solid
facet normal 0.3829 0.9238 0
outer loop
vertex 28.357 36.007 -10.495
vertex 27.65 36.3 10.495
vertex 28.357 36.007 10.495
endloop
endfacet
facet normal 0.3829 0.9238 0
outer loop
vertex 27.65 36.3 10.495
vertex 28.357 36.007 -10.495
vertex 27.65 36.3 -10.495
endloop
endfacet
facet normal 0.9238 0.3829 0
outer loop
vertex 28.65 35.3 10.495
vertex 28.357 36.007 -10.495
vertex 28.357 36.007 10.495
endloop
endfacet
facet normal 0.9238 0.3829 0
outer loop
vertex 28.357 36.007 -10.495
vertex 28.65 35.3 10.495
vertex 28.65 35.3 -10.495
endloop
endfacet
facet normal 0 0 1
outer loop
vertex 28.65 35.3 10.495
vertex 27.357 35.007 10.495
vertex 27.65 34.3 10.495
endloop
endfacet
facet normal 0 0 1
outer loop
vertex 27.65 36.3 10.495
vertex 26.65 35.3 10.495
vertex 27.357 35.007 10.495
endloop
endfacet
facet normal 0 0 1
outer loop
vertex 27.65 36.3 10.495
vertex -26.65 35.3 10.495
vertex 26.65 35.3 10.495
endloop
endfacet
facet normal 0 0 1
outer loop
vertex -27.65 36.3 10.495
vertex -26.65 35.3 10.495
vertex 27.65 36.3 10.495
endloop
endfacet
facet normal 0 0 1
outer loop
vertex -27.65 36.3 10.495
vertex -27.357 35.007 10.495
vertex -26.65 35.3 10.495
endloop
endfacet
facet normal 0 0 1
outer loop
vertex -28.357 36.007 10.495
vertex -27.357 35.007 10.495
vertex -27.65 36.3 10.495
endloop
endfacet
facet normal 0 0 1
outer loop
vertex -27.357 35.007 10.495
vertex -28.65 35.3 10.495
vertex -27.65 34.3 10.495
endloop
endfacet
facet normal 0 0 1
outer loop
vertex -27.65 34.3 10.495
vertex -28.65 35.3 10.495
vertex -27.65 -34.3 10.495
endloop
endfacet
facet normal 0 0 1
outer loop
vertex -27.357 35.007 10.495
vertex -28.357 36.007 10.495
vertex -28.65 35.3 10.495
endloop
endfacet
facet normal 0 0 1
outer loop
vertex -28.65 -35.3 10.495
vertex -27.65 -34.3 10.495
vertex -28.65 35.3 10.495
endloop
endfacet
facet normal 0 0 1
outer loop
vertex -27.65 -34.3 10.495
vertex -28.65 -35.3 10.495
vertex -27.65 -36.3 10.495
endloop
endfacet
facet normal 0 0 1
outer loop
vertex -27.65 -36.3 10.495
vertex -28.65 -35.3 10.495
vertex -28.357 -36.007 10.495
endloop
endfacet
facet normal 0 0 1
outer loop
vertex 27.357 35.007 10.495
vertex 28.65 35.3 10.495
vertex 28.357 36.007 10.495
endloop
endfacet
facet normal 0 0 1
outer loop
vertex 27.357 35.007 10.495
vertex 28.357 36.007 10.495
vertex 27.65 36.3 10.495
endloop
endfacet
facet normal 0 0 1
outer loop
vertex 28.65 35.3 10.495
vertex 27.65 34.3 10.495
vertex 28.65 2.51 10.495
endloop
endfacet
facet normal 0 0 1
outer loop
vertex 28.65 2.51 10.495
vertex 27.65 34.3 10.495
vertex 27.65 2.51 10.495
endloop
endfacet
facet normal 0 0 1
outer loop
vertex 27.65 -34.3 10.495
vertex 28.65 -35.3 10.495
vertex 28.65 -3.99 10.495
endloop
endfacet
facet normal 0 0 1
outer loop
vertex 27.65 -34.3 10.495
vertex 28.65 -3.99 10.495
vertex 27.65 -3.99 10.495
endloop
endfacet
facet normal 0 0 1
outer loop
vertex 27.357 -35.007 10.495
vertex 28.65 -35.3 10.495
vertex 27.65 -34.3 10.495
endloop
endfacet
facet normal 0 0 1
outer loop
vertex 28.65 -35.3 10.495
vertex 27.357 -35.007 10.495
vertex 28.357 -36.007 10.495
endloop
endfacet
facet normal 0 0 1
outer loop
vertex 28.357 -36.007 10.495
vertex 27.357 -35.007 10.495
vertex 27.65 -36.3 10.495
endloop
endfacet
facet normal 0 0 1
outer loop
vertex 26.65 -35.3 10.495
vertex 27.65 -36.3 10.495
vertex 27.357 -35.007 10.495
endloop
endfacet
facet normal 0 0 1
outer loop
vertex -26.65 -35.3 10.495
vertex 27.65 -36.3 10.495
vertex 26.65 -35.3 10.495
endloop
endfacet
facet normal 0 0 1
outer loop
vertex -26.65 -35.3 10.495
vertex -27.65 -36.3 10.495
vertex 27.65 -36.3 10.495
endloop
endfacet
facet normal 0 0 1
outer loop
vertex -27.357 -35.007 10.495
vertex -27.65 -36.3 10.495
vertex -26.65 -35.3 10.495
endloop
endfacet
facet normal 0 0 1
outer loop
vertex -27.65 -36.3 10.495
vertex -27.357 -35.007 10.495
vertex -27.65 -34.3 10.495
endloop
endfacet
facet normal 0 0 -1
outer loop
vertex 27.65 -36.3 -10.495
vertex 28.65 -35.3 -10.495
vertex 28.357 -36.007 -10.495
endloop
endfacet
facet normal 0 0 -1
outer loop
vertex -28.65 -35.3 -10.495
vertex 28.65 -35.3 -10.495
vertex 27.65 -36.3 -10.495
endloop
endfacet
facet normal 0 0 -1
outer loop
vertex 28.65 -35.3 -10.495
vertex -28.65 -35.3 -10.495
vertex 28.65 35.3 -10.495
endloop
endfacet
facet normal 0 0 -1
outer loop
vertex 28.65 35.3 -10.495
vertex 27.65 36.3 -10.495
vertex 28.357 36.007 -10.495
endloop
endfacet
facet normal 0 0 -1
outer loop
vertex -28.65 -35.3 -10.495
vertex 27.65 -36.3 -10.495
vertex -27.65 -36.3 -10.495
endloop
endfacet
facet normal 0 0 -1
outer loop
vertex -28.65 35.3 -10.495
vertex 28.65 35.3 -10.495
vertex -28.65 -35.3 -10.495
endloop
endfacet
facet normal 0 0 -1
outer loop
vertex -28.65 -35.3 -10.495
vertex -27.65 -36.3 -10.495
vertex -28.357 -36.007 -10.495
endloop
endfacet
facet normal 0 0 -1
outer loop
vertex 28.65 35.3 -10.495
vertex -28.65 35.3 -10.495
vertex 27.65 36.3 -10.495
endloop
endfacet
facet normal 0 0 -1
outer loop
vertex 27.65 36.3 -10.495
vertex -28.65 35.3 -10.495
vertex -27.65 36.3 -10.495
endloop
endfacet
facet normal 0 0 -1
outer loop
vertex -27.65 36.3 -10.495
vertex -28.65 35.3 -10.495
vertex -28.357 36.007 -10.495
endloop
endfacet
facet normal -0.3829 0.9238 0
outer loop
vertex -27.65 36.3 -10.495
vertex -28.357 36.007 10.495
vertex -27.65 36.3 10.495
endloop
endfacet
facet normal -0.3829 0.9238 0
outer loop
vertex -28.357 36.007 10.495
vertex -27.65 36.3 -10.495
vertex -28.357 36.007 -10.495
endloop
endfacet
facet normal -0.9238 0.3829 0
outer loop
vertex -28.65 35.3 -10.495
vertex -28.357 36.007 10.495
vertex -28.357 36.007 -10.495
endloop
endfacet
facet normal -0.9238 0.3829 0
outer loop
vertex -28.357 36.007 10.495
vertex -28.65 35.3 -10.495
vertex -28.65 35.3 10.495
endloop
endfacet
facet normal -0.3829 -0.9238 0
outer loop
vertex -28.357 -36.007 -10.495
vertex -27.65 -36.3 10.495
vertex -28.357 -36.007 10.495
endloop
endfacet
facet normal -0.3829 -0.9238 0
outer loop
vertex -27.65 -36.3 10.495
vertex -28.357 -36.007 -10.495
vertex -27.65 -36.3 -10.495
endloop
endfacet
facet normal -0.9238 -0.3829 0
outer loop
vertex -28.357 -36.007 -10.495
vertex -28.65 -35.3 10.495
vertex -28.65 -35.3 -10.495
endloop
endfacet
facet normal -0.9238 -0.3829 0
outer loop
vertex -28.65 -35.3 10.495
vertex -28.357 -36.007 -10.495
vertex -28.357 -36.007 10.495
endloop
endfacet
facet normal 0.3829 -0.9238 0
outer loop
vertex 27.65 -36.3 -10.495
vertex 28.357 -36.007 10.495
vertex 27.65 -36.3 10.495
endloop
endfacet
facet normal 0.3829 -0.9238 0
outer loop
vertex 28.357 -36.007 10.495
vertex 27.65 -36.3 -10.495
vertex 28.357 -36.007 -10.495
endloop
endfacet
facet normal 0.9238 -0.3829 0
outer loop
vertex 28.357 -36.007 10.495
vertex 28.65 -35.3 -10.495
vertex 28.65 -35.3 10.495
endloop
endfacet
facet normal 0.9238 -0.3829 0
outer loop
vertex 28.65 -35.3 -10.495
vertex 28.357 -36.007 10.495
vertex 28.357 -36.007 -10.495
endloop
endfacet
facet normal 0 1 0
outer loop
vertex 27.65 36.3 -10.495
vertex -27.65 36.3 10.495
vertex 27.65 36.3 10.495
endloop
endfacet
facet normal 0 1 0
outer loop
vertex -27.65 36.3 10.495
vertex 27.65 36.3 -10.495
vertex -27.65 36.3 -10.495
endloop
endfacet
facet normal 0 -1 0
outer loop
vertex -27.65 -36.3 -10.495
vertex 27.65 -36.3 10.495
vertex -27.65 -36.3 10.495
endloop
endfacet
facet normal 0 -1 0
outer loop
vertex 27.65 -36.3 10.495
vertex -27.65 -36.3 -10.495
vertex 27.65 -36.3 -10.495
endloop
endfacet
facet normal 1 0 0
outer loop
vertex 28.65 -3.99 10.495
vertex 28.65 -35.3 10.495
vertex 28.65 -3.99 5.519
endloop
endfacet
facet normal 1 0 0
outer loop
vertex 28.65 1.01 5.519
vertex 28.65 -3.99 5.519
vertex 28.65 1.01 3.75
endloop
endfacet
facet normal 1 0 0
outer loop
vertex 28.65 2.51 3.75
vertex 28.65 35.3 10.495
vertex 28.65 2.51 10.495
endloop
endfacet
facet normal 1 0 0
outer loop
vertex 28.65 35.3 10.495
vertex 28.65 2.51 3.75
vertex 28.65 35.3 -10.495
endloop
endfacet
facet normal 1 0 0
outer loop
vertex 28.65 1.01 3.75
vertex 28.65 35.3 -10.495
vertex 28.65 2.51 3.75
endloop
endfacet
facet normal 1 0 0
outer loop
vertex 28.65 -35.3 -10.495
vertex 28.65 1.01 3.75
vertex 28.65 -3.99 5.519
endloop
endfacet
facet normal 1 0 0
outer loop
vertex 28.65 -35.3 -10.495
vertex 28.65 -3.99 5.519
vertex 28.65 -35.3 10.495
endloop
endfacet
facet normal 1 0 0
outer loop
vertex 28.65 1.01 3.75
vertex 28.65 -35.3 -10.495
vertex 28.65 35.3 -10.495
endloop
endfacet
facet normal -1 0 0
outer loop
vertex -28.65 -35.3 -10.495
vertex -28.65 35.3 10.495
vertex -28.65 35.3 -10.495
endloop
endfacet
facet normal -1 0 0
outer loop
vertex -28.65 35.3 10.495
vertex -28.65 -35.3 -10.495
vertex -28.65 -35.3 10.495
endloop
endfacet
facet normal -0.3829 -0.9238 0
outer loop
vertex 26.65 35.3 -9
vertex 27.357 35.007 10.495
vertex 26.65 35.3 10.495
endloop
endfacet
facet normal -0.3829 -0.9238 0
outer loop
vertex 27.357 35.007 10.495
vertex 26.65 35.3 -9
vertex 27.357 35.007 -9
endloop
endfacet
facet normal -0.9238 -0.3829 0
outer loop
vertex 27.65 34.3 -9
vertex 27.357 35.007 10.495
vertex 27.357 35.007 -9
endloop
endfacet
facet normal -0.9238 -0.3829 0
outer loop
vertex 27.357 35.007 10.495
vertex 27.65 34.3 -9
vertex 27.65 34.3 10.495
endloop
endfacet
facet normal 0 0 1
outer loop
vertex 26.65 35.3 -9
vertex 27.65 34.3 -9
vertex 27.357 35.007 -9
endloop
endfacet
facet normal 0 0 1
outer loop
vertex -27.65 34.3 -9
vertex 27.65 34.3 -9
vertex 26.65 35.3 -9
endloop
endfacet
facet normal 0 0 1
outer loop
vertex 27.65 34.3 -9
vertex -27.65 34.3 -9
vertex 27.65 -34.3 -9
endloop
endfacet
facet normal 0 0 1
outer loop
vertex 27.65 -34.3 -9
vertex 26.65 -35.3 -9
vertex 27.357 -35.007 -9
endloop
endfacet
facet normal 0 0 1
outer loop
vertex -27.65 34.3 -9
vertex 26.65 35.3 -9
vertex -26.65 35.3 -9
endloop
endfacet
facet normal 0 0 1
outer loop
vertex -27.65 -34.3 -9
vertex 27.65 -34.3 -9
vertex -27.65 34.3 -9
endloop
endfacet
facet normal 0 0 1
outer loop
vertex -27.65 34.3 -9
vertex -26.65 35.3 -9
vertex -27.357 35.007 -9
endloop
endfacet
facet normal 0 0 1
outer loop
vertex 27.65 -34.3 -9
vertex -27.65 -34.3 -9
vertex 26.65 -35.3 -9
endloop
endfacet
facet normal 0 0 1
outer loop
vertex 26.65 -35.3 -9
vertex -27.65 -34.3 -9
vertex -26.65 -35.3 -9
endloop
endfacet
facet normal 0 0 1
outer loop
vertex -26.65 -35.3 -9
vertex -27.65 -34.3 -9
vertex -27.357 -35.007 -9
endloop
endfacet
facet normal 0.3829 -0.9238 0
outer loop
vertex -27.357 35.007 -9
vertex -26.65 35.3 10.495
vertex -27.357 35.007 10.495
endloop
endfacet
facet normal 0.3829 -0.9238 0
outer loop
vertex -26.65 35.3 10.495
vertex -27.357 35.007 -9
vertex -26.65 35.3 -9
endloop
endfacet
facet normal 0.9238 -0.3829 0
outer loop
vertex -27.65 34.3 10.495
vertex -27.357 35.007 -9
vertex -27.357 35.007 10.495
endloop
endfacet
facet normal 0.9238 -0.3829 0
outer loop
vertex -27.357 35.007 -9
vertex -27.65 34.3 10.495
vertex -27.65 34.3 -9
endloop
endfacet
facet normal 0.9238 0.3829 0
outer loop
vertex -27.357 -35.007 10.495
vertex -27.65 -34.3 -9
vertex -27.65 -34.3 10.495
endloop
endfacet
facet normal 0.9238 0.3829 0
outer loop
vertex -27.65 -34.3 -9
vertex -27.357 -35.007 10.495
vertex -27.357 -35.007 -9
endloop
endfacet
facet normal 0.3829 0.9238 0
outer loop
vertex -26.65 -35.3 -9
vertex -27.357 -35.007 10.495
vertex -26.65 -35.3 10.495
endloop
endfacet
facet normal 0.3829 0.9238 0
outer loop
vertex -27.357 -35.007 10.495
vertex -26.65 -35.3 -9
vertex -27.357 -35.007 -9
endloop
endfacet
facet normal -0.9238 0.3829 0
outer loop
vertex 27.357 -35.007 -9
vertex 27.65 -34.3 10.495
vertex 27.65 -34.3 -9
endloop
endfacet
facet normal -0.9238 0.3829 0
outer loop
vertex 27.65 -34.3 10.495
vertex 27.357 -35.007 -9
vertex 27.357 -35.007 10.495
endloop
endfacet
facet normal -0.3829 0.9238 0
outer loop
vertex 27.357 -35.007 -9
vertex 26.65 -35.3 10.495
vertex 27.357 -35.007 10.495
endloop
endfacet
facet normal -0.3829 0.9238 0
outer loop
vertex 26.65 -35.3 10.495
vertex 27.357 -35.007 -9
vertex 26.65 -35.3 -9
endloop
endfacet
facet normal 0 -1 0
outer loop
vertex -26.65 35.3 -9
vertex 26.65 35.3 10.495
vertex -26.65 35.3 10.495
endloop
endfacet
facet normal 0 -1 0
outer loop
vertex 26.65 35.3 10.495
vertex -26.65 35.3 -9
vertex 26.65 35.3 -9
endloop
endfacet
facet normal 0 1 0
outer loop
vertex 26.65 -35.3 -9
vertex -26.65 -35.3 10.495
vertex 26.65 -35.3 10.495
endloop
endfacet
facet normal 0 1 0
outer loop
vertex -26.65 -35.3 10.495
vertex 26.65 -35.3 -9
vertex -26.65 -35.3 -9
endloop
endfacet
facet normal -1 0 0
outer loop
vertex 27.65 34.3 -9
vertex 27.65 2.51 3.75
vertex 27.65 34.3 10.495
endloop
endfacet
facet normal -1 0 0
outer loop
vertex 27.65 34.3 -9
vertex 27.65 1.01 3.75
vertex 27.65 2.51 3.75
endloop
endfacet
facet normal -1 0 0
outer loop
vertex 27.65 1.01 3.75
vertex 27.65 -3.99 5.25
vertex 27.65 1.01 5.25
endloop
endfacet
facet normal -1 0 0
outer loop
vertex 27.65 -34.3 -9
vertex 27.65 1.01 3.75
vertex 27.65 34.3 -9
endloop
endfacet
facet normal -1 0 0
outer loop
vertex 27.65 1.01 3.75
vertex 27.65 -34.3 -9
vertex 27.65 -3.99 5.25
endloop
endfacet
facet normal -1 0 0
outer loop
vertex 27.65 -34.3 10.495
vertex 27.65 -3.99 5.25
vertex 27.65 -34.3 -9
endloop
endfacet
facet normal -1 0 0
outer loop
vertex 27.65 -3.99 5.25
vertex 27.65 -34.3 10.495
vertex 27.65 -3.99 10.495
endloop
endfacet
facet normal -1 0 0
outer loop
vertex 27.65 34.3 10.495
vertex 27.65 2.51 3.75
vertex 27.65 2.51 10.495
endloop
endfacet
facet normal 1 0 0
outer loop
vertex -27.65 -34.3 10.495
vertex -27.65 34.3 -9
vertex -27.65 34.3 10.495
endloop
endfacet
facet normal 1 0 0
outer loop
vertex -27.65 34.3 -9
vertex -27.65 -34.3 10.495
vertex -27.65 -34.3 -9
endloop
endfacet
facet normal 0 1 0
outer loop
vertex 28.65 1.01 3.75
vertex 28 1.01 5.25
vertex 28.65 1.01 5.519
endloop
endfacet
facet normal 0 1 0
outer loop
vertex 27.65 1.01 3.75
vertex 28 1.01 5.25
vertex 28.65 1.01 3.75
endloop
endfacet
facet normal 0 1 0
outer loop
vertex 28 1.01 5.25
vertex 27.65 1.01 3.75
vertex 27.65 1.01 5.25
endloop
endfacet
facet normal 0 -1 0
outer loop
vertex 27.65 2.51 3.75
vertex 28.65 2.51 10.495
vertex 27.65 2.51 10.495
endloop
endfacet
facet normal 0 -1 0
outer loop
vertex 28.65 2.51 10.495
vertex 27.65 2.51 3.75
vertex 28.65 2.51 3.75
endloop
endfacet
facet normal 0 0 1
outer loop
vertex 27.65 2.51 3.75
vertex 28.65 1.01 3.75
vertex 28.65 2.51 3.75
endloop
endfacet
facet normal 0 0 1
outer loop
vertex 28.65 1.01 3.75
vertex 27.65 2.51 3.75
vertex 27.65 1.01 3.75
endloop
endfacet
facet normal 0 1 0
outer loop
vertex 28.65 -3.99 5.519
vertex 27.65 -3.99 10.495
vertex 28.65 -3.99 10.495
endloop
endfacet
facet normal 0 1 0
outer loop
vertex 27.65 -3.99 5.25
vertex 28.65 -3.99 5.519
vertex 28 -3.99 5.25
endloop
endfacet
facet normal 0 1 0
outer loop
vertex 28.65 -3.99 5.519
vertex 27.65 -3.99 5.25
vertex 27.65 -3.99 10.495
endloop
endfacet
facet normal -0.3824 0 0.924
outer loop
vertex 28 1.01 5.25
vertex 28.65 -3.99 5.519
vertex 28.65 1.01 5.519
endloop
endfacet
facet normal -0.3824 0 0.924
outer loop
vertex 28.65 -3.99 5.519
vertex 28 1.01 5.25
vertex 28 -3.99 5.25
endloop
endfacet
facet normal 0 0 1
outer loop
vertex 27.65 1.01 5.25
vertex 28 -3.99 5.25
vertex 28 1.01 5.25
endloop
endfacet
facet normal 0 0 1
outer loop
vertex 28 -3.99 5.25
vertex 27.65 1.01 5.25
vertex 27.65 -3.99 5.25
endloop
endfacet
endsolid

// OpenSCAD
// file: ../components/db9/db9_negative.scad
use <../../basics/cube_fillet.scad>;
module db9_negative(){
    union(){
        //baseplate
        translate([0,0,-0.75]){
            cube_fillet([31,12.5,1.5], 1);
        }

        //connector

        translate([0,0,2.5]){
            cube_fillet([18, 9.5, 5], 1);
        }

        //mount holes
        translate([-12.5, 0, 0]){
            cylinder(h=5, r=1.55, $fn=20);
        }
        translate([12.5, 0, 0]){
            cylinder(h=5, r=1.55, $fn=20);
        }
    }
}

db9_negative();
// file: ../basics/cube_fillet.scad
// use $fn % 4 = 0;
module cube_fillet(lwh=[1,1,1], r=0.1, $fn=8, center=true) {
    $fn = ceil($fn / 4) * 4;
    
    center_translation = center ? [0,0,0] : [lwh[0] * 0.5, lwh[1] * 0.5, lwh[2] * 0.5, ];
    
    translate(center_translation){
        union(){
            //corners
            //NE
            translate([lwh[0] * 0.5 - r, lwh[1] * 0.5 - r, -lwh[2]*0.5]){ 
                cylinder(h=lwh[2], r=r, $fn=$fn);
            }
            //SE
            translate([-(lwh[0] * 0.5 - r), lwh[1] * 0.5 - r, -lwh[2]*0.5]){
                cylinder(h=lwh[2], r=r, $fn=$fn);
            }
            //NE
            translate([-(lwh[0] * 0.5 - r), -(lwh[1] * 0.5 - r), -lwh[2]*0.5]){
                cylinder(h=lwh[2], r=r, $fn=$fn);
            }
            //SE
            translate([lwh[0] * 0.5 - r, -(lwh[1] * 0.5 - r), -lwh[2]*0.5]){
                cylinder(h=lwh[2], r=r, $fn=$fn);
            }
            
            // boxes
            cube([lwh[0] - 2*r, lwh[1], lwh[2]], true);
            cube([lwh[0], lwh[1] - 2*r, lwh[2]], true);
        };
    }
};

cube_fillet(center=false);
// main file
use <../basics/cube_fillet.scad>;
use <../components/db9/db9_negative.scad>;


inner_tol = 1;
wall_thickness = 1;
standoff_height = 6;
box_height = 14;
box_inner = [53.3 + 2*inner_tol, 68.6 + 2*inner_tol, box_height + standoff_height];

difference(){
    cube_fillet([box_inner[0] + 2*wall_thickness, box_inner[1] + 2*wall_thickness, box_inner[2] + wall_thickness - 0.01], 1);
    translate([0, 0, wall_thickness]){
        cube_fillet(box_inner, 1);
    }
    // serial ports
    translate([20, 1.01, 10]){
        rotate([90,0,0]){
            db9_negative();
        }
    }
};
